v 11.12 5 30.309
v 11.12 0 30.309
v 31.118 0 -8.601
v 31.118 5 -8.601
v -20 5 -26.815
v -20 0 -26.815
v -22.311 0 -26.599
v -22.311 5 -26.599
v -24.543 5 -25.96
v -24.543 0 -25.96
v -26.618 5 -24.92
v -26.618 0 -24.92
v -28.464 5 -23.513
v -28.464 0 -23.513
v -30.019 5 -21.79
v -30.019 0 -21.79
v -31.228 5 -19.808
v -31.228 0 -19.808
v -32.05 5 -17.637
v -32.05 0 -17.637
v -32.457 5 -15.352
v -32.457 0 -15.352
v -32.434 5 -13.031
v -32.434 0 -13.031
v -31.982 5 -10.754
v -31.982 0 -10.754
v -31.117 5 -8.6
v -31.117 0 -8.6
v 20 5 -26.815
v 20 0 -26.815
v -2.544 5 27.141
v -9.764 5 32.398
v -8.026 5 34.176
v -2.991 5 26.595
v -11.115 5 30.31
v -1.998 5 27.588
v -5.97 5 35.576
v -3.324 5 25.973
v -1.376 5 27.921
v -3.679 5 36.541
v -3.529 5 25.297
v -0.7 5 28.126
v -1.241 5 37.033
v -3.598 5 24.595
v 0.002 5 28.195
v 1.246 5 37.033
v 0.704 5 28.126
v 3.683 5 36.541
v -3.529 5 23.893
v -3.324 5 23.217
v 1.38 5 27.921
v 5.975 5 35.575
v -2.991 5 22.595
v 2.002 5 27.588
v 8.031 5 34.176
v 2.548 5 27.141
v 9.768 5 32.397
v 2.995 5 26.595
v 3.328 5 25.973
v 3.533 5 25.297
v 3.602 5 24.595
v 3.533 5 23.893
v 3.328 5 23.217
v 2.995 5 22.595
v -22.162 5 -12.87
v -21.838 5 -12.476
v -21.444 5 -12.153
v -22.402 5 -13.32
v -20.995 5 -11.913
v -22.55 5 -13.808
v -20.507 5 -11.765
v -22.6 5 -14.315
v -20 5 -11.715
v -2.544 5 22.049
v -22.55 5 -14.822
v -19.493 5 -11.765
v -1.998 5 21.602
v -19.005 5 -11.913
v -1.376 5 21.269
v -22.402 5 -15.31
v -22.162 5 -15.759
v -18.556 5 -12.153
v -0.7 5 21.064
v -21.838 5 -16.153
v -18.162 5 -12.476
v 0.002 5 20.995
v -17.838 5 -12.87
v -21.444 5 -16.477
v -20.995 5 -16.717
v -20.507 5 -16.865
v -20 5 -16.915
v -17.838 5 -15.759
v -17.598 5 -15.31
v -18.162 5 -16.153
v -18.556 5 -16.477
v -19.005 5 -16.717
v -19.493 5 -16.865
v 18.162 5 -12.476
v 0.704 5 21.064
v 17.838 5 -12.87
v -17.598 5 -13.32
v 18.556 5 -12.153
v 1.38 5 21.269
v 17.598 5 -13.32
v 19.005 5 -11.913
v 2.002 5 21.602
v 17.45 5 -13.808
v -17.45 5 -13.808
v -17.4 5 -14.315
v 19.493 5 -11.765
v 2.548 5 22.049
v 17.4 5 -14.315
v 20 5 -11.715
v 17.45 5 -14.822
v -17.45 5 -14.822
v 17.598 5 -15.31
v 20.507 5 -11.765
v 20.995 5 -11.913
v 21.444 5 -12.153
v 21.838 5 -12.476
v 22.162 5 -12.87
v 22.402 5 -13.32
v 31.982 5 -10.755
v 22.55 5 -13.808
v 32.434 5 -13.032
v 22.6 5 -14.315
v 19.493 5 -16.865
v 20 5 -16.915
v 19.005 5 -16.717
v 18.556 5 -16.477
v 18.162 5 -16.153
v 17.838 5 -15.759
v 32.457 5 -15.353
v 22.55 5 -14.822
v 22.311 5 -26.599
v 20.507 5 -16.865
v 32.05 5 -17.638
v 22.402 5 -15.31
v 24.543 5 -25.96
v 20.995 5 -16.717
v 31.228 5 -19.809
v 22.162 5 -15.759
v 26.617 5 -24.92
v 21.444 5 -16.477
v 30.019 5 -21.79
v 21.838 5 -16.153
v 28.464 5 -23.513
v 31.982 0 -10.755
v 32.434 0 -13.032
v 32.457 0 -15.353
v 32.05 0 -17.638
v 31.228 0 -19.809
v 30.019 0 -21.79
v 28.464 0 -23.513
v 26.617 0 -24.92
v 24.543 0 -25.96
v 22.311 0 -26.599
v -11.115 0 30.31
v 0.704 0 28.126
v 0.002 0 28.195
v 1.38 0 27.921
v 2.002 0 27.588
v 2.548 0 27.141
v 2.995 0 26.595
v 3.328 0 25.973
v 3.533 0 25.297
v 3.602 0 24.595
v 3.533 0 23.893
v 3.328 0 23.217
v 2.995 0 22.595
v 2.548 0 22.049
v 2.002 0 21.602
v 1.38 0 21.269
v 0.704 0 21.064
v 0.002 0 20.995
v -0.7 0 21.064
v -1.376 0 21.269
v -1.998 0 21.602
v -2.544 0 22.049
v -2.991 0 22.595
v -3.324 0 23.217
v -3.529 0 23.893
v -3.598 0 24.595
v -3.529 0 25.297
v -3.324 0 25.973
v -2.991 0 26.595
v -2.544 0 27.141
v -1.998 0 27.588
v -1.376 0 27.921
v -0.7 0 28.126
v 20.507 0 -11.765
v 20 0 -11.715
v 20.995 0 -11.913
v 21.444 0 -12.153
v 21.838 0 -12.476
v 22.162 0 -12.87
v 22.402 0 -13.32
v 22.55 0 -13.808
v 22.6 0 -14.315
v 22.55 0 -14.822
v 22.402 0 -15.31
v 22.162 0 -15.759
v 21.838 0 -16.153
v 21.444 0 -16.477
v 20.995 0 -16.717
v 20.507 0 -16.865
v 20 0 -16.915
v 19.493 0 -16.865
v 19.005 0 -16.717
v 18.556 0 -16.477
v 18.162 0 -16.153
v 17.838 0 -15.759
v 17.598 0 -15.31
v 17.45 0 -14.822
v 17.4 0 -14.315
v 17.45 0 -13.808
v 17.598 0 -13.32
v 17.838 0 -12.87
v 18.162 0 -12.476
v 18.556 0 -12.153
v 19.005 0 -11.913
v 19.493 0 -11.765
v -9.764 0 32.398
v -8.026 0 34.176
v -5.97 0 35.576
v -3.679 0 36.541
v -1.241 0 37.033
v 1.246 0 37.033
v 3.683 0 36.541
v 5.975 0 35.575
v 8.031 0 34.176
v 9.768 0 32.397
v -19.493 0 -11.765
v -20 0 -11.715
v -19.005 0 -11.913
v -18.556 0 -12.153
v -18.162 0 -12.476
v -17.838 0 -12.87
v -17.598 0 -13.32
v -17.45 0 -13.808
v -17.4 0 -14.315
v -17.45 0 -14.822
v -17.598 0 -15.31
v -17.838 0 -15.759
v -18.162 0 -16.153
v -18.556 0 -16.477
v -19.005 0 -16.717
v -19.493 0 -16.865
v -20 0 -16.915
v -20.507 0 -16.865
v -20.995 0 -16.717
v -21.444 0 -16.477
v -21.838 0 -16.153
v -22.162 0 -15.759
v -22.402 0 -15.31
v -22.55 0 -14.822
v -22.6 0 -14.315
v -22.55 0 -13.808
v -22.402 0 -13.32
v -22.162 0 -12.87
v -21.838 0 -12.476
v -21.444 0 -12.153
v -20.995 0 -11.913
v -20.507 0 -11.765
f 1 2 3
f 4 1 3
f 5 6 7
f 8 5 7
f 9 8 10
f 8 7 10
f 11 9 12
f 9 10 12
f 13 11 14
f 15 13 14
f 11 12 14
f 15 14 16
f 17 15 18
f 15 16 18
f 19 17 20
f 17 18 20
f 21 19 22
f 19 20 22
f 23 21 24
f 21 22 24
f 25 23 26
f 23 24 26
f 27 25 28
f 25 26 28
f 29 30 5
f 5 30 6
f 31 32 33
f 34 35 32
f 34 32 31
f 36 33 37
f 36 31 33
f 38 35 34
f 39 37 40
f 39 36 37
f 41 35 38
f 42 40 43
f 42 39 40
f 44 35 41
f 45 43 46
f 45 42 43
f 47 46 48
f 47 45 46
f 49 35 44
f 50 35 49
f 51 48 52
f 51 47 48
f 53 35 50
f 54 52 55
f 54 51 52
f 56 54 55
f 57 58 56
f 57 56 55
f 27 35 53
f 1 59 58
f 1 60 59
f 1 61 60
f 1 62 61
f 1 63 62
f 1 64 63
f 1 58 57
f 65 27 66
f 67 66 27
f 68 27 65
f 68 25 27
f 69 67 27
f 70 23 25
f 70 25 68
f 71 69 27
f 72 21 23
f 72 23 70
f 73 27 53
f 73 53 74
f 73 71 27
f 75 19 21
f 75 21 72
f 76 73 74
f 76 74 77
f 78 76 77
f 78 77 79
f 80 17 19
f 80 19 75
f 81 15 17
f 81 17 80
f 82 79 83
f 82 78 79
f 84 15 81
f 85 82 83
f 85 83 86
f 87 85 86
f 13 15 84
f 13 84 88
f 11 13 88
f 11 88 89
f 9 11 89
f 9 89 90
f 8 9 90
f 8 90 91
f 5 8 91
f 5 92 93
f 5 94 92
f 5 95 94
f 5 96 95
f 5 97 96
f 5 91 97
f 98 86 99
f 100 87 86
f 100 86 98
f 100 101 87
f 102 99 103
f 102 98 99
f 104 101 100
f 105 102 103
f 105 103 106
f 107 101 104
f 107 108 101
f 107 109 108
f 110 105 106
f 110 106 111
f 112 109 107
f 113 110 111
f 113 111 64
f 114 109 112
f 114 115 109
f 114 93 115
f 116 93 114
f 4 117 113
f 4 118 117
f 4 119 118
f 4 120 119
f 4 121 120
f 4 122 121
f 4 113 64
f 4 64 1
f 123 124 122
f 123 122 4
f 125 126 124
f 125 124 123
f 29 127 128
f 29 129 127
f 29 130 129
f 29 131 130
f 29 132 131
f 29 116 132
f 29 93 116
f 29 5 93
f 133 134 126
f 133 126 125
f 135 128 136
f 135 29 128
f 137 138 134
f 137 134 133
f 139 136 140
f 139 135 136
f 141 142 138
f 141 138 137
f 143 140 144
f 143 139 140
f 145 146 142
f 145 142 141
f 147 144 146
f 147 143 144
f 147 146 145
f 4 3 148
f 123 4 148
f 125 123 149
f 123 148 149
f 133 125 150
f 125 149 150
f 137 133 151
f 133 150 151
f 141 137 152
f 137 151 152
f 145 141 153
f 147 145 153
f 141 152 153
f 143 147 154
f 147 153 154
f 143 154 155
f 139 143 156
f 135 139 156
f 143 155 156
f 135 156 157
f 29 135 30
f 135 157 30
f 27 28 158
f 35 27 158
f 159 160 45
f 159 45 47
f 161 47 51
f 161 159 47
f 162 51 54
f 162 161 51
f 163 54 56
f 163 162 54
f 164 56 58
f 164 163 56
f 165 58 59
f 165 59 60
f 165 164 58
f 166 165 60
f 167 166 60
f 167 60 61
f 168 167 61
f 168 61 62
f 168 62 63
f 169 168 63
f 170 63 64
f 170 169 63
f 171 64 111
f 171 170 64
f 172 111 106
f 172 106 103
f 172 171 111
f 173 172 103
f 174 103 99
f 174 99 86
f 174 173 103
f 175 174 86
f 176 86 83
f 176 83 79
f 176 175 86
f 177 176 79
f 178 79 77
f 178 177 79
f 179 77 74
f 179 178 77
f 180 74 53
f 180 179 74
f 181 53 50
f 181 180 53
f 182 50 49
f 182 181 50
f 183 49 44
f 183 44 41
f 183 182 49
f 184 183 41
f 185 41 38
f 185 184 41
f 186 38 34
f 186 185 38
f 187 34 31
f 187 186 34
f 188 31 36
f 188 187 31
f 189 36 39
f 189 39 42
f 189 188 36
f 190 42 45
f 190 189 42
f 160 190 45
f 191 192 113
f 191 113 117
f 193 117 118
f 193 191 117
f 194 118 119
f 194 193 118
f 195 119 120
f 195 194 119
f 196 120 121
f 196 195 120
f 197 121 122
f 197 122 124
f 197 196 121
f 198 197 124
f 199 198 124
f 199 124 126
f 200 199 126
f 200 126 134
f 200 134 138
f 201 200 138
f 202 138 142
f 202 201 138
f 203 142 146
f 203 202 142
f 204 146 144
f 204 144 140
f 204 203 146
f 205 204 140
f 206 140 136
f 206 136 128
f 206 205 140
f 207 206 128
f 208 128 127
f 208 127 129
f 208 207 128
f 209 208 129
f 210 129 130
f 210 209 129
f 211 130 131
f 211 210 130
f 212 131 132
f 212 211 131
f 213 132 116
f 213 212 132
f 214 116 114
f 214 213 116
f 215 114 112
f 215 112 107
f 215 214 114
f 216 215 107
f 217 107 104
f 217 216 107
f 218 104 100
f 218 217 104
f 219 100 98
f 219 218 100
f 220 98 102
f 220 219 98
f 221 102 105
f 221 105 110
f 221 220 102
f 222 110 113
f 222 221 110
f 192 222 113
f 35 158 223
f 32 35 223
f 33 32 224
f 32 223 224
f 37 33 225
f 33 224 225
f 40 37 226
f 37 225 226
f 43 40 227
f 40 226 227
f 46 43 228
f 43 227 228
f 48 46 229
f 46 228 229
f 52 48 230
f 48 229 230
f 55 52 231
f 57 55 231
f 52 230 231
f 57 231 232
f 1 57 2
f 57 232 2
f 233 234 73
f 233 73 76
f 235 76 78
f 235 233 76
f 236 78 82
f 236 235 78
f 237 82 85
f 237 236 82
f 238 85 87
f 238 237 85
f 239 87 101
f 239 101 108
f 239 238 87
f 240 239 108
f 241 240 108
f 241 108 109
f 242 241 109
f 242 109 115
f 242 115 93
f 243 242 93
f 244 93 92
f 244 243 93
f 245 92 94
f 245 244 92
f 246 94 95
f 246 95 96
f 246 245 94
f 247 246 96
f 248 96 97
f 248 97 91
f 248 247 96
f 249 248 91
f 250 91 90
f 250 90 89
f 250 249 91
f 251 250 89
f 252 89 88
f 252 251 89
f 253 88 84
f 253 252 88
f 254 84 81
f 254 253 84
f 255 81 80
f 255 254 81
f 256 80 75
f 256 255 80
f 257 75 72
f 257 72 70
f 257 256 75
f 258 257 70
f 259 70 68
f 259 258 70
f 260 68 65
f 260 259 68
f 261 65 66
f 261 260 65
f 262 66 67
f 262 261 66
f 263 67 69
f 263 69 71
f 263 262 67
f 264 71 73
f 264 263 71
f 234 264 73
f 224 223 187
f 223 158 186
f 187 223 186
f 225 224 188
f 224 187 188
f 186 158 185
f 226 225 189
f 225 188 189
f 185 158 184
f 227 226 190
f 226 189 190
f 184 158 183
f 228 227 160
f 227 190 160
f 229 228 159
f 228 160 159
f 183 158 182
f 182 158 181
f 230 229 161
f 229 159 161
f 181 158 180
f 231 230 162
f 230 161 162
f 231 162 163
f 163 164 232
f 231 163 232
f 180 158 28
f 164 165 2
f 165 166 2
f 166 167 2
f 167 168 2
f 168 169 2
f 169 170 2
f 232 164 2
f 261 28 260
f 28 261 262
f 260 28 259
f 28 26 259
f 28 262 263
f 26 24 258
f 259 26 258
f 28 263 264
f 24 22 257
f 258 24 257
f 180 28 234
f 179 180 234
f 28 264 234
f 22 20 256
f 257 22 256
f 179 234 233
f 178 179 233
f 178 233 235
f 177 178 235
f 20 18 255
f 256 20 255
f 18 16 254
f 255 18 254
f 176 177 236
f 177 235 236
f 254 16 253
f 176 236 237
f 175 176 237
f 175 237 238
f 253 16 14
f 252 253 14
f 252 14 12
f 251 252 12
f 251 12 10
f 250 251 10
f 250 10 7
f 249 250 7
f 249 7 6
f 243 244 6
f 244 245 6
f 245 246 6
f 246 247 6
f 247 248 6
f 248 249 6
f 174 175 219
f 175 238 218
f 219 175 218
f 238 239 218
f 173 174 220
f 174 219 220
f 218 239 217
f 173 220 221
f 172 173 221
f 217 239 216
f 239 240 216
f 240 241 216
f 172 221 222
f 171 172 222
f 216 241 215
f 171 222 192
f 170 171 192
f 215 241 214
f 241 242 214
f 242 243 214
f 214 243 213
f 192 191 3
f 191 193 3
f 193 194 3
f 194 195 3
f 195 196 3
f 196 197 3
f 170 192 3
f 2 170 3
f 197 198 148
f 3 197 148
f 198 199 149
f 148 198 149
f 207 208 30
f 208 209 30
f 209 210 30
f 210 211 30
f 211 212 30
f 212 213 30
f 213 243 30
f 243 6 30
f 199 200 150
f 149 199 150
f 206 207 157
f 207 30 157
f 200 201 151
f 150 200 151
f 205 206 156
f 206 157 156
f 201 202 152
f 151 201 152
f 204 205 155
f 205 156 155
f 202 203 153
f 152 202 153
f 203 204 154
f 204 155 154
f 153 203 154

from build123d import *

# Parameters (mm, degrees)
SKETCH1_R           = 2.6
SKETCH1_R_2         = 3.6
BOSS_EXTRUDE1_DEPTH = 5


with BuildPart() as part:
    # Sketch1 → Boss-Extrude1 (new body)
    with BuildSketch(Plane(origin=(0, 0, 0), x_dir=(1, 0, 0), z_dir=(0, 1, 0))):
        with BuildLine():
            Line((-31.117126255, 8.600085423), (-11.115122128, -30.309917119))
            ThreePointArc((-11.115122128, -30.309917119), (0.002513408, -37.095067694), (11.119596019, -30.309011222))
            Line((11.119596019, -30.309011222), (31.117591892, 8.60099132))
            ThreePointArc((31.117591892, 8.60099132), (30.669449235, 20.827449945), (20, 26.814934838))
            Line((20, 26.814934838), (-20, 26.814934838))
            ThreePointArc((-20, 26.814934838), (-30.669714562, 20.82701524), (-31.117126255, 8.600085423))
        make_face()
        with Locations(Location((-20, 14.314934838, 0), (0, 0, 270))):
            Circle(SKETCH1_R, mode=Mode.SUBTRACT)
        with Locations(Location((20, 14.314934838, 0), (0, 0, 270))):
            Circle(SKETCH1_R, mode=Mode.SUBTRACT)
        with Locations(Location((0.002004127, -24.595067704, 0), (0, 0, 270))):
            Circle(SKETCH1_R_2, mode=Mode.SUBTRACT)
    extrude(amount=BOSS_EXTRUDE1_DEPTH)


solid = part.part
